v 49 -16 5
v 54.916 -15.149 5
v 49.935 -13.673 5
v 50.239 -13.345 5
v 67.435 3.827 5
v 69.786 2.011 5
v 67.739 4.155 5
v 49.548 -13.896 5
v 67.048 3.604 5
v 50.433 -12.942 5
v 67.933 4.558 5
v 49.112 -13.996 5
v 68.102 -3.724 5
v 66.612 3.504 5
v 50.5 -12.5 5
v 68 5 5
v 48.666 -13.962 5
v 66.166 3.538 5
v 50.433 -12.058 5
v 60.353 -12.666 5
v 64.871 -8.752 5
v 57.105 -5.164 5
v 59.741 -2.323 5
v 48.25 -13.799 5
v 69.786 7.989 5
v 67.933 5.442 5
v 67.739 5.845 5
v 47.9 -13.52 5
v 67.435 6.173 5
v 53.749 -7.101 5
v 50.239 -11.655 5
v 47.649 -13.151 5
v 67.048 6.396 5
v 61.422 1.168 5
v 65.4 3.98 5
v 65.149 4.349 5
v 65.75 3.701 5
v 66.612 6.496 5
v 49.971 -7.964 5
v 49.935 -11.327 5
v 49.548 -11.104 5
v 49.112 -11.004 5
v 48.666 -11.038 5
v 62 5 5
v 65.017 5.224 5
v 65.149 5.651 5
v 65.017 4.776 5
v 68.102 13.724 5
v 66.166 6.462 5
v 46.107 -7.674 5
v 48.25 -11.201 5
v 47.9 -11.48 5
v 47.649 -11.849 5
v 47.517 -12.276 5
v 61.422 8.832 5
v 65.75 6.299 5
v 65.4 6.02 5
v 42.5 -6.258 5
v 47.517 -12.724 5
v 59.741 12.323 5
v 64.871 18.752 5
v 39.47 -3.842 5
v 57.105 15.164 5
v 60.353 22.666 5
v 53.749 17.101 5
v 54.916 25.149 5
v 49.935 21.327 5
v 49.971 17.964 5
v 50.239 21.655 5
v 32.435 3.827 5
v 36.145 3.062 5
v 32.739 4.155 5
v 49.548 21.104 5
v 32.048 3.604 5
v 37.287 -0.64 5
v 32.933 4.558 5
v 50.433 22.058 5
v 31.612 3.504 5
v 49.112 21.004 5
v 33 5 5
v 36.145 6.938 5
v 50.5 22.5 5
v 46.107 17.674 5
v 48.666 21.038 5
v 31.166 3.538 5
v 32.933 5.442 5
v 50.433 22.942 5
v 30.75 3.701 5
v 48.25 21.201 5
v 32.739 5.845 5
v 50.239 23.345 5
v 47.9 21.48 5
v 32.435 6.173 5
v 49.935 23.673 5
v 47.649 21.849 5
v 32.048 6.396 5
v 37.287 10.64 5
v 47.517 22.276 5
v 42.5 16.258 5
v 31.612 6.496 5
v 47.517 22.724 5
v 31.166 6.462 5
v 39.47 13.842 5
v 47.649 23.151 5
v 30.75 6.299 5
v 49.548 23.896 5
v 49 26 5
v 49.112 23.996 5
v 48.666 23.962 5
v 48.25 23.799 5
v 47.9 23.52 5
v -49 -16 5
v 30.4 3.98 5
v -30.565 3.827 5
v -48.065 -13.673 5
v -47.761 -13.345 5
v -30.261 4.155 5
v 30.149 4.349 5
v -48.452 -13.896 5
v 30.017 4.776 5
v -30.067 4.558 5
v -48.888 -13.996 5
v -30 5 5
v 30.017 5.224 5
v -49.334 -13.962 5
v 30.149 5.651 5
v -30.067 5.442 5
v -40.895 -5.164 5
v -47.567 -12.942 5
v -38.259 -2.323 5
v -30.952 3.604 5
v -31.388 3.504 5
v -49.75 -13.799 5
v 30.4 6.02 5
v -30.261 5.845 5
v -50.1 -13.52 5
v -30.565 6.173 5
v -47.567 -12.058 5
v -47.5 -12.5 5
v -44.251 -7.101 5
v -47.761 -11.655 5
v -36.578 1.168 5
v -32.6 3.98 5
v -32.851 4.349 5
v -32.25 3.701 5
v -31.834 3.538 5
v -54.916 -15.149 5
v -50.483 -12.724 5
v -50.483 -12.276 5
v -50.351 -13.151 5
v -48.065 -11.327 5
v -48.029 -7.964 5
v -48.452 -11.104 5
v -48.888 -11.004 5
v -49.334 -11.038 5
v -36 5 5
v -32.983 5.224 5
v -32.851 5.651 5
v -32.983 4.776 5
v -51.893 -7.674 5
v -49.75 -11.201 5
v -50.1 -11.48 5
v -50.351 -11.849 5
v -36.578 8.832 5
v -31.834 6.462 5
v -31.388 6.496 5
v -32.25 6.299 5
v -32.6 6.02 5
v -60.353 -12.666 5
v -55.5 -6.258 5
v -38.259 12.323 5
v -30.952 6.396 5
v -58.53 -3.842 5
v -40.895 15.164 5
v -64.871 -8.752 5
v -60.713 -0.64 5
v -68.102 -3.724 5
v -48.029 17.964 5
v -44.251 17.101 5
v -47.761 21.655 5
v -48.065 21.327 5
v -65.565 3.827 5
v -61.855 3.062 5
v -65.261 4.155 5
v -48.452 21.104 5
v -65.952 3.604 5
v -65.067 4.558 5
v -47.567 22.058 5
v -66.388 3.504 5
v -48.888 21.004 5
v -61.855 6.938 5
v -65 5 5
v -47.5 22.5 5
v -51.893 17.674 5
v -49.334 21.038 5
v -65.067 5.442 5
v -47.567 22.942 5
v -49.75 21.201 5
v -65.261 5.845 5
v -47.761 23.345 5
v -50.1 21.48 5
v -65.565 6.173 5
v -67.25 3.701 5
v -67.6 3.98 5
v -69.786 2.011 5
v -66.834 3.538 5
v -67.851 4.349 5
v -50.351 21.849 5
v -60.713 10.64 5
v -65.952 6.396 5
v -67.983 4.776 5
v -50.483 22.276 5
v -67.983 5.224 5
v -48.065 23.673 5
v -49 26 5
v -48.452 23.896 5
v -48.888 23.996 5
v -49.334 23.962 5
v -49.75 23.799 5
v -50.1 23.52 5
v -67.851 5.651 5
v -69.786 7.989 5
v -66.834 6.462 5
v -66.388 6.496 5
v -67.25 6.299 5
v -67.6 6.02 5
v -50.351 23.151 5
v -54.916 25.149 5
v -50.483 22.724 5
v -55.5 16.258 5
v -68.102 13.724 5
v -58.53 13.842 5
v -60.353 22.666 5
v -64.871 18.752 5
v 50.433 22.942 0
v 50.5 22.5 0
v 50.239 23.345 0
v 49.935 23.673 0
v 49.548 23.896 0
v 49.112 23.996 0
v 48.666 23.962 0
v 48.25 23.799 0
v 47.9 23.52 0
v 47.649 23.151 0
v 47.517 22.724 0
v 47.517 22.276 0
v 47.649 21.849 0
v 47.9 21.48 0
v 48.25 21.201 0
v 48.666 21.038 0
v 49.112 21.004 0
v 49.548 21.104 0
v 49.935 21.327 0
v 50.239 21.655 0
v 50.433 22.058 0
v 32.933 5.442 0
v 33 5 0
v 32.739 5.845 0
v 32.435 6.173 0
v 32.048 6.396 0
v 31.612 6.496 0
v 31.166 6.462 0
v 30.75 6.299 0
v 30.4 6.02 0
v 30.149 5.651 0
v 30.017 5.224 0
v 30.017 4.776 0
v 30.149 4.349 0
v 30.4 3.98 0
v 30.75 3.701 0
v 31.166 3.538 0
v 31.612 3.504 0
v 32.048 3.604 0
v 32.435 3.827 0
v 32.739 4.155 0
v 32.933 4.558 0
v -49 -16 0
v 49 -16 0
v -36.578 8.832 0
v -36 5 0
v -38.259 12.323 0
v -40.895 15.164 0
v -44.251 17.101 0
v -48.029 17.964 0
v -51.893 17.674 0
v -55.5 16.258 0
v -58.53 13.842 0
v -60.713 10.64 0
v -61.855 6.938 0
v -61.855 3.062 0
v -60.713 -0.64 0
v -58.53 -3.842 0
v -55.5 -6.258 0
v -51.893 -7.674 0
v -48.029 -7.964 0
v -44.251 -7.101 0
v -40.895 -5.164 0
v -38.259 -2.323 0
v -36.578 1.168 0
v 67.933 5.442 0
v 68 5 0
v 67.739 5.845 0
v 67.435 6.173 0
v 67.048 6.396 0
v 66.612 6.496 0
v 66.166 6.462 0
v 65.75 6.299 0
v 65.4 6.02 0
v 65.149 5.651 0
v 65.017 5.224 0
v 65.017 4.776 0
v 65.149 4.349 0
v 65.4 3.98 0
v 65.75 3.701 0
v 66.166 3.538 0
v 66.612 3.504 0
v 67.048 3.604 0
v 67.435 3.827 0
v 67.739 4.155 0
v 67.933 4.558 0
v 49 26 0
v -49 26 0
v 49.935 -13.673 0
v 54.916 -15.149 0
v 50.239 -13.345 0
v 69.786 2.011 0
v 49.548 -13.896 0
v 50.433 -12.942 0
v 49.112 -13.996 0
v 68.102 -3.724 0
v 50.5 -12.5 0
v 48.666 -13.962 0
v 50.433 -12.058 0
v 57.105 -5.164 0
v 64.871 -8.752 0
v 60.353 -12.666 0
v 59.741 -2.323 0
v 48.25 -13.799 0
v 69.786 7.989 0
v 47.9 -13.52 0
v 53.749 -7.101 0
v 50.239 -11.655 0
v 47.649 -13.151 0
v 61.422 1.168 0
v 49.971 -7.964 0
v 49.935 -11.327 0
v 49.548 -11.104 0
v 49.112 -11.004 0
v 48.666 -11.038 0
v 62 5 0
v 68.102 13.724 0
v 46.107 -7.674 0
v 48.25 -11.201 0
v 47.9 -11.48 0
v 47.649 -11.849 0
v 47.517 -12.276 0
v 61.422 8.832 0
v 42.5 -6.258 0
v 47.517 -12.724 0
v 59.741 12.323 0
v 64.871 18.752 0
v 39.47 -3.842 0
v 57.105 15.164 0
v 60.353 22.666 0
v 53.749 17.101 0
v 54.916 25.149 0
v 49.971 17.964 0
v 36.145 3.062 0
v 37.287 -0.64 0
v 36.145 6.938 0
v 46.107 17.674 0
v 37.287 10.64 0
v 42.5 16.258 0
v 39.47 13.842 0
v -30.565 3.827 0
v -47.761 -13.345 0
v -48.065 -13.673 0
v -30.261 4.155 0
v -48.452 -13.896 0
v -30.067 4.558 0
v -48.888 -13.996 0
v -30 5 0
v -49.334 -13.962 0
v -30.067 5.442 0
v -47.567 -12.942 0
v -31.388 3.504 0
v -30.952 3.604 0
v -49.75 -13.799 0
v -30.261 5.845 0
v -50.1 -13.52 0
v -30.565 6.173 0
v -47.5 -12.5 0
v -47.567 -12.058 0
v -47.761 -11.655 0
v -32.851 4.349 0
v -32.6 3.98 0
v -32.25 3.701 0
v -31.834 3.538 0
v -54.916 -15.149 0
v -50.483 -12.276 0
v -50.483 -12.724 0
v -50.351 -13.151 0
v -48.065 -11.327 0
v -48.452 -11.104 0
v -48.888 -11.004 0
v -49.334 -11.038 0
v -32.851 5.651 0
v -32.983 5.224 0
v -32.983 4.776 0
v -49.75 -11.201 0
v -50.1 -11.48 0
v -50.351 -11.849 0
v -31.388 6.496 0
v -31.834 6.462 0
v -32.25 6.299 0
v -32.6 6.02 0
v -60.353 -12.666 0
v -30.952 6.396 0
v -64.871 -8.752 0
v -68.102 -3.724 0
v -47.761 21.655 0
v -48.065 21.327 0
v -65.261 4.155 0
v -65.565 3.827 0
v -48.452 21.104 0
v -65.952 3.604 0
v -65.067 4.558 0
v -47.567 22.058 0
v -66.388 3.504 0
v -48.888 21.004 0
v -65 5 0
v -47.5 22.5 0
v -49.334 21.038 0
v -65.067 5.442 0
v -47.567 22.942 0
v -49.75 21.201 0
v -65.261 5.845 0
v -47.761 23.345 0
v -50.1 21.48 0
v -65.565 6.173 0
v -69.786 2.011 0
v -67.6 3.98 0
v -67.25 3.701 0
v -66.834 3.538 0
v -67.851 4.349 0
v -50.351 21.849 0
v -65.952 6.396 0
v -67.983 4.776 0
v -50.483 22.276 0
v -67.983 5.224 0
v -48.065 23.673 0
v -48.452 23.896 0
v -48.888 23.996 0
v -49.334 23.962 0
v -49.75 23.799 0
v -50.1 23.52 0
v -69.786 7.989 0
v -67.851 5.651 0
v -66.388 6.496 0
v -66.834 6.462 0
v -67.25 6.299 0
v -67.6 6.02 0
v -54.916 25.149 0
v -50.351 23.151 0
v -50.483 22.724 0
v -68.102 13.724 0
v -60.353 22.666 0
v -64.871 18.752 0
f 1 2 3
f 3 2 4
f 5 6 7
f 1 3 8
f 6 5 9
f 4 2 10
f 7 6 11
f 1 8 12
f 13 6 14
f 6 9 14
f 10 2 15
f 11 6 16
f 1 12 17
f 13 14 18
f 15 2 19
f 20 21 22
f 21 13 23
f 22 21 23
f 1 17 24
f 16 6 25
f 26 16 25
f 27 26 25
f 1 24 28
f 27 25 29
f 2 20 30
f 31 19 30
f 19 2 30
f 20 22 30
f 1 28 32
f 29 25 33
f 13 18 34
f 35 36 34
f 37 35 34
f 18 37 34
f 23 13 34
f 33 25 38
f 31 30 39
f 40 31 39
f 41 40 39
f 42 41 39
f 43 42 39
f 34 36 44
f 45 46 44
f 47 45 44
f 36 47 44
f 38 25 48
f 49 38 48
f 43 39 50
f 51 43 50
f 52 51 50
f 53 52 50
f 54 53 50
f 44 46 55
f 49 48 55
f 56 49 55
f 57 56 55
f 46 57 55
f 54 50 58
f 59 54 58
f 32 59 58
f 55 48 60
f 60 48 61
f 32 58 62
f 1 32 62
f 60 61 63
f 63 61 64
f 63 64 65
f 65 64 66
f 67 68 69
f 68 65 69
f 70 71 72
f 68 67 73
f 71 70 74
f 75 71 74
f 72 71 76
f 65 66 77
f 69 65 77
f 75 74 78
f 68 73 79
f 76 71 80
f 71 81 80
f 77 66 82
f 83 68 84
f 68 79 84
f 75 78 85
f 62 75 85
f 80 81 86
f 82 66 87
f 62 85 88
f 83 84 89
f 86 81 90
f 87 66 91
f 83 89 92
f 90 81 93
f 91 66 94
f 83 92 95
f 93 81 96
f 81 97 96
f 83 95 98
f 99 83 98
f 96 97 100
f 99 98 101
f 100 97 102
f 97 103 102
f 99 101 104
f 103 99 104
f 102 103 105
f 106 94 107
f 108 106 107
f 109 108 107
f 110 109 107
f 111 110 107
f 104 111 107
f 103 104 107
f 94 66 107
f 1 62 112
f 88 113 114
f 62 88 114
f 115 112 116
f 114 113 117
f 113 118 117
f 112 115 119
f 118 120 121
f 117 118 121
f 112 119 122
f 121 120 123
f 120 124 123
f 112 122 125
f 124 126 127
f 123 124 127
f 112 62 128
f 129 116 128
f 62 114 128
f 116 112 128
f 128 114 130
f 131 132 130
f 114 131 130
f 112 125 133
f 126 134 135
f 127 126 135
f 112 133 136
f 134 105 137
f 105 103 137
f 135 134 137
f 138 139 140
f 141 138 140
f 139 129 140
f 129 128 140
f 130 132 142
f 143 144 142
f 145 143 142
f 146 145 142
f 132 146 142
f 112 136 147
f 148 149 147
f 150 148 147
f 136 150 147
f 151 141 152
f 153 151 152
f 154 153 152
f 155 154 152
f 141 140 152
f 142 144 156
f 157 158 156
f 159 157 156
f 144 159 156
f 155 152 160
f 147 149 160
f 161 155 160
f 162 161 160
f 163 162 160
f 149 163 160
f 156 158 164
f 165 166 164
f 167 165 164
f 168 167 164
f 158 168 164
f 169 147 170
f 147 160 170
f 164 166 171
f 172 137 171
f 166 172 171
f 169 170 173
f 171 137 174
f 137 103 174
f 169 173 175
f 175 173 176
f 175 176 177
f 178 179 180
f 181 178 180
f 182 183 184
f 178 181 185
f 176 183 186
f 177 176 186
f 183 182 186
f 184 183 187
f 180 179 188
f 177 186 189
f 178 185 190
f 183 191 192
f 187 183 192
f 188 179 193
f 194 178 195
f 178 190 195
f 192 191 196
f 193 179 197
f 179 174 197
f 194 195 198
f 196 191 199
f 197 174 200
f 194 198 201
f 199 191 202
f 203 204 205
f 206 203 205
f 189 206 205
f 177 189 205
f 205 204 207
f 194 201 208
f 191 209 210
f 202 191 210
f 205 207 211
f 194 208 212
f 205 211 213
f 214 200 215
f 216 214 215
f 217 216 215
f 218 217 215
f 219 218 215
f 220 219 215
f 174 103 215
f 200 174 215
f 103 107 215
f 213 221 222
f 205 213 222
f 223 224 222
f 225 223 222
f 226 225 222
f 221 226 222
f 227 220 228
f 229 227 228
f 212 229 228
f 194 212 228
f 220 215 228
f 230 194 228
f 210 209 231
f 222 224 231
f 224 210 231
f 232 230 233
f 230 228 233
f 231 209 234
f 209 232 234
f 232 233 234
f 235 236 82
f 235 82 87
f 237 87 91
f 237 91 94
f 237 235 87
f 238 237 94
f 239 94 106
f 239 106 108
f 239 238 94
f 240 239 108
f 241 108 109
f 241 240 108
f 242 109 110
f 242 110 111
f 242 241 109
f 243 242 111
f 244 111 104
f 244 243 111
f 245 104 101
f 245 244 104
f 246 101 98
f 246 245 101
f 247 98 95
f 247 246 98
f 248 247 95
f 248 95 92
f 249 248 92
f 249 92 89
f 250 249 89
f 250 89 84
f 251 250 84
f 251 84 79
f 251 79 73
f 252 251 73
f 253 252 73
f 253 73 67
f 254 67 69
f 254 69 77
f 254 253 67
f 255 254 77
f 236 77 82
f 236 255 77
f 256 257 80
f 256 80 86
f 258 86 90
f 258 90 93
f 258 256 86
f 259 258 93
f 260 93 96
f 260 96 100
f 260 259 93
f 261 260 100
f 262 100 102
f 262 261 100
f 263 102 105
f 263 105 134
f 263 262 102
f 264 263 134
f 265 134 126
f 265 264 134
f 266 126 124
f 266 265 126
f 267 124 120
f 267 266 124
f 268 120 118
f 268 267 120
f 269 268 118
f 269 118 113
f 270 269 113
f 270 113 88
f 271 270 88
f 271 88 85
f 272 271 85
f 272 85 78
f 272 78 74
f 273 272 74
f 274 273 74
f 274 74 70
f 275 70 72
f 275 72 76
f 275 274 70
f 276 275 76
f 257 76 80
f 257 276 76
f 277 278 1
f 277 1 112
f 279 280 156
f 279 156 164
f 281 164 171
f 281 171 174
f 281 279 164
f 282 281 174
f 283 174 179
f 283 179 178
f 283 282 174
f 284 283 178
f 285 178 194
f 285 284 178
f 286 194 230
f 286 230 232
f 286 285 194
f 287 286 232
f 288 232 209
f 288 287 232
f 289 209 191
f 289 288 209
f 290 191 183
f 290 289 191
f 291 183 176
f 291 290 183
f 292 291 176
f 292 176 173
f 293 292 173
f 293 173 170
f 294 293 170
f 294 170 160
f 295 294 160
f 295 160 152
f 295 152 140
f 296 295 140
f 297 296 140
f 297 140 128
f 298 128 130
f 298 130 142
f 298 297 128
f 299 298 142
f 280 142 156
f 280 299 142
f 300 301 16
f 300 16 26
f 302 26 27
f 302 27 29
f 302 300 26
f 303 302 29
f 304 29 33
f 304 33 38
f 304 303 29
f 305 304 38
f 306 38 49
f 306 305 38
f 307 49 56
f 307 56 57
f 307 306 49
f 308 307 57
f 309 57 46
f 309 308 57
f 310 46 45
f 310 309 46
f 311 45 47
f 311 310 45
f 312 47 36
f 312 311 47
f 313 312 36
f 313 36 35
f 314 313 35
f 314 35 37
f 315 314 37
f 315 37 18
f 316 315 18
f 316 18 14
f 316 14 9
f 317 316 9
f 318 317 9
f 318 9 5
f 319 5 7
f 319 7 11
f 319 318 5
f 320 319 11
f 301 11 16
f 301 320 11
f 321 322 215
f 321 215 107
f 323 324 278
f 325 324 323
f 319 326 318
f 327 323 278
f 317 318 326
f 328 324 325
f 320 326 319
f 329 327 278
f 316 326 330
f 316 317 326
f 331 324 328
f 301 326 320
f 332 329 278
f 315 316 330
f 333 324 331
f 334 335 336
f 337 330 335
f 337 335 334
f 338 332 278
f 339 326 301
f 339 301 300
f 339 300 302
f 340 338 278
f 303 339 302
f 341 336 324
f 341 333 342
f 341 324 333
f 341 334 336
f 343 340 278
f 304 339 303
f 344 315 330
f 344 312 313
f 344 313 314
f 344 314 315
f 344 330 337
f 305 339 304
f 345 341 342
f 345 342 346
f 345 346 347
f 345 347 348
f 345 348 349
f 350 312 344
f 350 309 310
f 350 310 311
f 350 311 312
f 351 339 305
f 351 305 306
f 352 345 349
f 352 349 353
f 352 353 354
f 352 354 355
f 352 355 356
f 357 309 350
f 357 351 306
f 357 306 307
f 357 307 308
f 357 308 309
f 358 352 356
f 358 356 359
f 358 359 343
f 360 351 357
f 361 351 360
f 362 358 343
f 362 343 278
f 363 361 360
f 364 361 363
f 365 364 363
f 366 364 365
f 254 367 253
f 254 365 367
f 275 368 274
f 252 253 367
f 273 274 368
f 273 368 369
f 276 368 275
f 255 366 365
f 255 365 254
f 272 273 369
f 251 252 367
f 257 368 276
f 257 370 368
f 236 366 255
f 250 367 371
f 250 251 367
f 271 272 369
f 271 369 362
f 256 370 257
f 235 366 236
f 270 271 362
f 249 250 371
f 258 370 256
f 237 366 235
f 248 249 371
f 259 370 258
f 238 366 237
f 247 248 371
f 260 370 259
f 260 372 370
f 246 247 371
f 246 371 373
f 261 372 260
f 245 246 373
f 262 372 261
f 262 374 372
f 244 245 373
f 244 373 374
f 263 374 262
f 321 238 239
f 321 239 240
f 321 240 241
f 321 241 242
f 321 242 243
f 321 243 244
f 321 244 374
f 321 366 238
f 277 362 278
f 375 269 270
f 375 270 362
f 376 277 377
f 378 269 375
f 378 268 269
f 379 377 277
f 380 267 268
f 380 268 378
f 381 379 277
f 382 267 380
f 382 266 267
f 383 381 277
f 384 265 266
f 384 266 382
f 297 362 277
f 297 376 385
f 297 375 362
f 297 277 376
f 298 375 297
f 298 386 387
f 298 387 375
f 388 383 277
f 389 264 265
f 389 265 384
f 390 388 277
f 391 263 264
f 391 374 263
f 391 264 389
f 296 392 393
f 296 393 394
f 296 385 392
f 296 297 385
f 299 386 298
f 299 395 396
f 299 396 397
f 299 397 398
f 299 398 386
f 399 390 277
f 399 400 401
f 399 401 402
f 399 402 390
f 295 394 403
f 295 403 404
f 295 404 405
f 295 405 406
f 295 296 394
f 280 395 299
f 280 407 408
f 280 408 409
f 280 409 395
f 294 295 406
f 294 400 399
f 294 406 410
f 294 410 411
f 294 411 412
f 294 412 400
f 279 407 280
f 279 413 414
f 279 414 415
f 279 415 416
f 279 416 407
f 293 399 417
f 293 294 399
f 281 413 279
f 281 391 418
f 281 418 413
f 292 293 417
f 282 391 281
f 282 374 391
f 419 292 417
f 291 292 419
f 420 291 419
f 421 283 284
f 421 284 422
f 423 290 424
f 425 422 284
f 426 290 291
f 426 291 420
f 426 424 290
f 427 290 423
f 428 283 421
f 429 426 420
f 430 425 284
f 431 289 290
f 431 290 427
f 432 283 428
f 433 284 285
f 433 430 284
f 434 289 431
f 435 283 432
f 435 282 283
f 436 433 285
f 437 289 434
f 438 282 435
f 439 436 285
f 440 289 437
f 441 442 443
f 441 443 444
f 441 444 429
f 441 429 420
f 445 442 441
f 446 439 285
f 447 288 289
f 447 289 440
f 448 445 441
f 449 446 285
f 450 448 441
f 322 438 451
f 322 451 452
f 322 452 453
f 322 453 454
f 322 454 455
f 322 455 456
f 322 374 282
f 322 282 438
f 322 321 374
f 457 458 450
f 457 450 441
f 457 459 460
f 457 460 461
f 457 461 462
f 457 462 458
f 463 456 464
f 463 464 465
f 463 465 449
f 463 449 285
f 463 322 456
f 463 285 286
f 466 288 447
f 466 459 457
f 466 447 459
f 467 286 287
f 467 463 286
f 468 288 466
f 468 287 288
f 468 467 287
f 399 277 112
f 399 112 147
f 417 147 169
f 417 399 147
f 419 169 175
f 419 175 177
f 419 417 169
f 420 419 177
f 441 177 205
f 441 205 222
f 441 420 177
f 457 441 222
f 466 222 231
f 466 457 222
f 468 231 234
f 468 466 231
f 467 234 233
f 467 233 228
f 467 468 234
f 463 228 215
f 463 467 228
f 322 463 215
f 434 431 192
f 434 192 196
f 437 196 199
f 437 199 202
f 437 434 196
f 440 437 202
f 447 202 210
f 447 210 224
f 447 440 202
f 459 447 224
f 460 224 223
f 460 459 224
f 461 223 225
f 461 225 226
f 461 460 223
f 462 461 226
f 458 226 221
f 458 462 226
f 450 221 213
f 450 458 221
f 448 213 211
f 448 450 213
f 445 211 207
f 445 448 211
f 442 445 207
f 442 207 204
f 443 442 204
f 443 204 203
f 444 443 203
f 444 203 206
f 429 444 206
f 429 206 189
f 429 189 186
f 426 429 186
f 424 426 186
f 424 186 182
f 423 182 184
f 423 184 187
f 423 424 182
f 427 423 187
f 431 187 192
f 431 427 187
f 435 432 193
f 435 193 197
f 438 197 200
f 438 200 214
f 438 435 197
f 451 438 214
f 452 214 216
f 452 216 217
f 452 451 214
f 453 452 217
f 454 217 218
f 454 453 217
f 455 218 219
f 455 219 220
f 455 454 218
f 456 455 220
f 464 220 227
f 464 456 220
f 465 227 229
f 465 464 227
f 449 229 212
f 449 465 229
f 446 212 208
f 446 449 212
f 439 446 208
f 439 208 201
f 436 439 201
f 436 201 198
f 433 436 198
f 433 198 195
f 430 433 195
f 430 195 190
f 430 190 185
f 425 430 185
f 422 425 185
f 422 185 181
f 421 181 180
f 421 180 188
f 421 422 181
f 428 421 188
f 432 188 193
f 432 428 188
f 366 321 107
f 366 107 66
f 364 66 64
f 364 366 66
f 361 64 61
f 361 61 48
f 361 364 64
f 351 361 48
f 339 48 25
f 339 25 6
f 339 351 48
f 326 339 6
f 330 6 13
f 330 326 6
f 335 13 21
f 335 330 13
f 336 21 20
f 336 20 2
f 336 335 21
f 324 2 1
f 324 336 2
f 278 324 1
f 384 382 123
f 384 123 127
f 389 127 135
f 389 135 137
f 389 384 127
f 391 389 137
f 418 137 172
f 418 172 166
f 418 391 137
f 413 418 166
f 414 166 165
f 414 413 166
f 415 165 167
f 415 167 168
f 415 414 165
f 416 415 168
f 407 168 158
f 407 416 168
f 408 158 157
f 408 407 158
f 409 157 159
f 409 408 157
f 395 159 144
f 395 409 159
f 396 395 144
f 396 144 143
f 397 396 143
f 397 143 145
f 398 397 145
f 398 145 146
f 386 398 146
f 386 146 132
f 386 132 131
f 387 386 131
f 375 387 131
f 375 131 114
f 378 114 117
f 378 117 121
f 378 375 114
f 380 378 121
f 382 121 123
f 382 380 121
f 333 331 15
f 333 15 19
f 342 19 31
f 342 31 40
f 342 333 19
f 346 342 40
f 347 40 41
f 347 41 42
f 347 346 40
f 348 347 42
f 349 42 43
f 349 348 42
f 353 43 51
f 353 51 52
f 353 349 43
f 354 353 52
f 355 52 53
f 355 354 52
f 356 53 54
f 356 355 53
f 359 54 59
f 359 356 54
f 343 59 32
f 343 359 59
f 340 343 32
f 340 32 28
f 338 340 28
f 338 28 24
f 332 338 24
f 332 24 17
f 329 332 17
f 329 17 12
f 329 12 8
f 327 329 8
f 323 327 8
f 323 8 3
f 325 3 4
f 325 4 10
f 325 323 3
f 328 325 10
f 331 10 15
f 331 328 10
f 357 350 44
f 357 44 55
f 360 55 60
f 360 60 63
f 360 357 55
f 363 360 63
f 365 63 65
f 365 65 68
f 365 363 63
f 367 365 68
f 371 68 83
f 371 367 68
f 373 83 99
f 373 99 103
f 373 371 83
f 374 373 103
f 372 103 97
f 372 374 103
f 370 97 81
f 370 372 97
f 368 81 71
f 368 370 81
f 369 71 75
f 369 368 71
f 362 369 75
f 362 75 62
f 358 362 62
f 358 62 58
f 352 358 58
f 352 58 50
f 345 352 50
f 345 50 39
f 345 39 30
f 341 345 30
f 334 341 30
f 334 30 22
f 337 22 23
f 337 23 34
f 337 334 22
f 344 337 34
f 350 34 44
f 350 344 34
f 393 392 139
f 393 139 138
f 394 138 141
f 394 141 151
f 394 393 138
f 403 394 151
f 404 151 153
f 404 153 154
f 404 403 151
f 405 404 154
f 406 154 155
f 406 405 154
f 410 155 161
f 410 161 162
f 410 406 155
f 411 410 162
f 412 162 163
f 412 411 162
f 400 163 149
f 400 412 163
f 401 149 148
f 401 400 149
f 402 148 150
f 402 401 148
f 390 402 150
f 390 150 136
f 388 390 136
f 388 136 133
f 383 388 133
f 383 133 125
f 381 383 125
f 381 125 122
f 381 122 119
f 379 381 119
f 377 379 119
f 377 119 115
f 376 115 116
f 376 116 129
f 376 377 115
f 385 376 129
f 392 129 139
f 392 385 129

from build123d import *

# Parameters (mm, degrees)
SKETCH1_R           = 1.5
SKETCH1_R_2         = 13
BOSS_EXTRUDE1_DEPTH = 5


with BuildPart() as part:
    # Sketch1 → Boss-Extrude1 (new body)
    with BuildSketch(Plane.XY):
        with BuildLine():
            Line((-49, 26), (49, 26))
            ThreePointArc((49, 26), (70, 5), (49, -16))
            Line((49, -16), (-49, -16))
            ThreePointArc((-49, -16), (-70, 5), (-49, 26))
        make_face()
        with Locations((49, -12.5)):
            Circle(SKETCH1_R, mode=Mode.SUBTRACT)
        with Locations((66.5, 5)):
            Circle(SKETCH1_R, mode=Mode.SUBTRACT)
        with Locations((31.5, 5)):
            Circle(SKETCH1_R, mode=Mode.SUBTRACT)
        with Locations((49, 22.5)):
            Circle(SKETCH1_R, mode=Mode.SUBTRACT)
        with Locations((-49, -12.5)):
            Circle(SKETCH1_R, mode=Mode.SUBTRACT)
        with Locations((-31.5, 5)):
            Circle(SKETCH1_R, mode=Mode.SUBTRACT)
        with Locations((-66.5, 5)):
            Circle(SKETCH1_R, mode=Mode.SUBTRACT)
        with Locations((-49, 22.5)):
            Circle(SKETCH1_R, mode=Mode.SUBTRACT)
        with Locations((-49, 5)):
            Circle(SKETCH1_R_2, mode=Mode.SUBTRACT)
        with Locations((49, 5)):
            Circle(SKETCH1_R_2, mode=Mode.SUBTRACT)
    extrude(amount=BOSS_EXTRUDE1_DEPTH)


solid = part.part
